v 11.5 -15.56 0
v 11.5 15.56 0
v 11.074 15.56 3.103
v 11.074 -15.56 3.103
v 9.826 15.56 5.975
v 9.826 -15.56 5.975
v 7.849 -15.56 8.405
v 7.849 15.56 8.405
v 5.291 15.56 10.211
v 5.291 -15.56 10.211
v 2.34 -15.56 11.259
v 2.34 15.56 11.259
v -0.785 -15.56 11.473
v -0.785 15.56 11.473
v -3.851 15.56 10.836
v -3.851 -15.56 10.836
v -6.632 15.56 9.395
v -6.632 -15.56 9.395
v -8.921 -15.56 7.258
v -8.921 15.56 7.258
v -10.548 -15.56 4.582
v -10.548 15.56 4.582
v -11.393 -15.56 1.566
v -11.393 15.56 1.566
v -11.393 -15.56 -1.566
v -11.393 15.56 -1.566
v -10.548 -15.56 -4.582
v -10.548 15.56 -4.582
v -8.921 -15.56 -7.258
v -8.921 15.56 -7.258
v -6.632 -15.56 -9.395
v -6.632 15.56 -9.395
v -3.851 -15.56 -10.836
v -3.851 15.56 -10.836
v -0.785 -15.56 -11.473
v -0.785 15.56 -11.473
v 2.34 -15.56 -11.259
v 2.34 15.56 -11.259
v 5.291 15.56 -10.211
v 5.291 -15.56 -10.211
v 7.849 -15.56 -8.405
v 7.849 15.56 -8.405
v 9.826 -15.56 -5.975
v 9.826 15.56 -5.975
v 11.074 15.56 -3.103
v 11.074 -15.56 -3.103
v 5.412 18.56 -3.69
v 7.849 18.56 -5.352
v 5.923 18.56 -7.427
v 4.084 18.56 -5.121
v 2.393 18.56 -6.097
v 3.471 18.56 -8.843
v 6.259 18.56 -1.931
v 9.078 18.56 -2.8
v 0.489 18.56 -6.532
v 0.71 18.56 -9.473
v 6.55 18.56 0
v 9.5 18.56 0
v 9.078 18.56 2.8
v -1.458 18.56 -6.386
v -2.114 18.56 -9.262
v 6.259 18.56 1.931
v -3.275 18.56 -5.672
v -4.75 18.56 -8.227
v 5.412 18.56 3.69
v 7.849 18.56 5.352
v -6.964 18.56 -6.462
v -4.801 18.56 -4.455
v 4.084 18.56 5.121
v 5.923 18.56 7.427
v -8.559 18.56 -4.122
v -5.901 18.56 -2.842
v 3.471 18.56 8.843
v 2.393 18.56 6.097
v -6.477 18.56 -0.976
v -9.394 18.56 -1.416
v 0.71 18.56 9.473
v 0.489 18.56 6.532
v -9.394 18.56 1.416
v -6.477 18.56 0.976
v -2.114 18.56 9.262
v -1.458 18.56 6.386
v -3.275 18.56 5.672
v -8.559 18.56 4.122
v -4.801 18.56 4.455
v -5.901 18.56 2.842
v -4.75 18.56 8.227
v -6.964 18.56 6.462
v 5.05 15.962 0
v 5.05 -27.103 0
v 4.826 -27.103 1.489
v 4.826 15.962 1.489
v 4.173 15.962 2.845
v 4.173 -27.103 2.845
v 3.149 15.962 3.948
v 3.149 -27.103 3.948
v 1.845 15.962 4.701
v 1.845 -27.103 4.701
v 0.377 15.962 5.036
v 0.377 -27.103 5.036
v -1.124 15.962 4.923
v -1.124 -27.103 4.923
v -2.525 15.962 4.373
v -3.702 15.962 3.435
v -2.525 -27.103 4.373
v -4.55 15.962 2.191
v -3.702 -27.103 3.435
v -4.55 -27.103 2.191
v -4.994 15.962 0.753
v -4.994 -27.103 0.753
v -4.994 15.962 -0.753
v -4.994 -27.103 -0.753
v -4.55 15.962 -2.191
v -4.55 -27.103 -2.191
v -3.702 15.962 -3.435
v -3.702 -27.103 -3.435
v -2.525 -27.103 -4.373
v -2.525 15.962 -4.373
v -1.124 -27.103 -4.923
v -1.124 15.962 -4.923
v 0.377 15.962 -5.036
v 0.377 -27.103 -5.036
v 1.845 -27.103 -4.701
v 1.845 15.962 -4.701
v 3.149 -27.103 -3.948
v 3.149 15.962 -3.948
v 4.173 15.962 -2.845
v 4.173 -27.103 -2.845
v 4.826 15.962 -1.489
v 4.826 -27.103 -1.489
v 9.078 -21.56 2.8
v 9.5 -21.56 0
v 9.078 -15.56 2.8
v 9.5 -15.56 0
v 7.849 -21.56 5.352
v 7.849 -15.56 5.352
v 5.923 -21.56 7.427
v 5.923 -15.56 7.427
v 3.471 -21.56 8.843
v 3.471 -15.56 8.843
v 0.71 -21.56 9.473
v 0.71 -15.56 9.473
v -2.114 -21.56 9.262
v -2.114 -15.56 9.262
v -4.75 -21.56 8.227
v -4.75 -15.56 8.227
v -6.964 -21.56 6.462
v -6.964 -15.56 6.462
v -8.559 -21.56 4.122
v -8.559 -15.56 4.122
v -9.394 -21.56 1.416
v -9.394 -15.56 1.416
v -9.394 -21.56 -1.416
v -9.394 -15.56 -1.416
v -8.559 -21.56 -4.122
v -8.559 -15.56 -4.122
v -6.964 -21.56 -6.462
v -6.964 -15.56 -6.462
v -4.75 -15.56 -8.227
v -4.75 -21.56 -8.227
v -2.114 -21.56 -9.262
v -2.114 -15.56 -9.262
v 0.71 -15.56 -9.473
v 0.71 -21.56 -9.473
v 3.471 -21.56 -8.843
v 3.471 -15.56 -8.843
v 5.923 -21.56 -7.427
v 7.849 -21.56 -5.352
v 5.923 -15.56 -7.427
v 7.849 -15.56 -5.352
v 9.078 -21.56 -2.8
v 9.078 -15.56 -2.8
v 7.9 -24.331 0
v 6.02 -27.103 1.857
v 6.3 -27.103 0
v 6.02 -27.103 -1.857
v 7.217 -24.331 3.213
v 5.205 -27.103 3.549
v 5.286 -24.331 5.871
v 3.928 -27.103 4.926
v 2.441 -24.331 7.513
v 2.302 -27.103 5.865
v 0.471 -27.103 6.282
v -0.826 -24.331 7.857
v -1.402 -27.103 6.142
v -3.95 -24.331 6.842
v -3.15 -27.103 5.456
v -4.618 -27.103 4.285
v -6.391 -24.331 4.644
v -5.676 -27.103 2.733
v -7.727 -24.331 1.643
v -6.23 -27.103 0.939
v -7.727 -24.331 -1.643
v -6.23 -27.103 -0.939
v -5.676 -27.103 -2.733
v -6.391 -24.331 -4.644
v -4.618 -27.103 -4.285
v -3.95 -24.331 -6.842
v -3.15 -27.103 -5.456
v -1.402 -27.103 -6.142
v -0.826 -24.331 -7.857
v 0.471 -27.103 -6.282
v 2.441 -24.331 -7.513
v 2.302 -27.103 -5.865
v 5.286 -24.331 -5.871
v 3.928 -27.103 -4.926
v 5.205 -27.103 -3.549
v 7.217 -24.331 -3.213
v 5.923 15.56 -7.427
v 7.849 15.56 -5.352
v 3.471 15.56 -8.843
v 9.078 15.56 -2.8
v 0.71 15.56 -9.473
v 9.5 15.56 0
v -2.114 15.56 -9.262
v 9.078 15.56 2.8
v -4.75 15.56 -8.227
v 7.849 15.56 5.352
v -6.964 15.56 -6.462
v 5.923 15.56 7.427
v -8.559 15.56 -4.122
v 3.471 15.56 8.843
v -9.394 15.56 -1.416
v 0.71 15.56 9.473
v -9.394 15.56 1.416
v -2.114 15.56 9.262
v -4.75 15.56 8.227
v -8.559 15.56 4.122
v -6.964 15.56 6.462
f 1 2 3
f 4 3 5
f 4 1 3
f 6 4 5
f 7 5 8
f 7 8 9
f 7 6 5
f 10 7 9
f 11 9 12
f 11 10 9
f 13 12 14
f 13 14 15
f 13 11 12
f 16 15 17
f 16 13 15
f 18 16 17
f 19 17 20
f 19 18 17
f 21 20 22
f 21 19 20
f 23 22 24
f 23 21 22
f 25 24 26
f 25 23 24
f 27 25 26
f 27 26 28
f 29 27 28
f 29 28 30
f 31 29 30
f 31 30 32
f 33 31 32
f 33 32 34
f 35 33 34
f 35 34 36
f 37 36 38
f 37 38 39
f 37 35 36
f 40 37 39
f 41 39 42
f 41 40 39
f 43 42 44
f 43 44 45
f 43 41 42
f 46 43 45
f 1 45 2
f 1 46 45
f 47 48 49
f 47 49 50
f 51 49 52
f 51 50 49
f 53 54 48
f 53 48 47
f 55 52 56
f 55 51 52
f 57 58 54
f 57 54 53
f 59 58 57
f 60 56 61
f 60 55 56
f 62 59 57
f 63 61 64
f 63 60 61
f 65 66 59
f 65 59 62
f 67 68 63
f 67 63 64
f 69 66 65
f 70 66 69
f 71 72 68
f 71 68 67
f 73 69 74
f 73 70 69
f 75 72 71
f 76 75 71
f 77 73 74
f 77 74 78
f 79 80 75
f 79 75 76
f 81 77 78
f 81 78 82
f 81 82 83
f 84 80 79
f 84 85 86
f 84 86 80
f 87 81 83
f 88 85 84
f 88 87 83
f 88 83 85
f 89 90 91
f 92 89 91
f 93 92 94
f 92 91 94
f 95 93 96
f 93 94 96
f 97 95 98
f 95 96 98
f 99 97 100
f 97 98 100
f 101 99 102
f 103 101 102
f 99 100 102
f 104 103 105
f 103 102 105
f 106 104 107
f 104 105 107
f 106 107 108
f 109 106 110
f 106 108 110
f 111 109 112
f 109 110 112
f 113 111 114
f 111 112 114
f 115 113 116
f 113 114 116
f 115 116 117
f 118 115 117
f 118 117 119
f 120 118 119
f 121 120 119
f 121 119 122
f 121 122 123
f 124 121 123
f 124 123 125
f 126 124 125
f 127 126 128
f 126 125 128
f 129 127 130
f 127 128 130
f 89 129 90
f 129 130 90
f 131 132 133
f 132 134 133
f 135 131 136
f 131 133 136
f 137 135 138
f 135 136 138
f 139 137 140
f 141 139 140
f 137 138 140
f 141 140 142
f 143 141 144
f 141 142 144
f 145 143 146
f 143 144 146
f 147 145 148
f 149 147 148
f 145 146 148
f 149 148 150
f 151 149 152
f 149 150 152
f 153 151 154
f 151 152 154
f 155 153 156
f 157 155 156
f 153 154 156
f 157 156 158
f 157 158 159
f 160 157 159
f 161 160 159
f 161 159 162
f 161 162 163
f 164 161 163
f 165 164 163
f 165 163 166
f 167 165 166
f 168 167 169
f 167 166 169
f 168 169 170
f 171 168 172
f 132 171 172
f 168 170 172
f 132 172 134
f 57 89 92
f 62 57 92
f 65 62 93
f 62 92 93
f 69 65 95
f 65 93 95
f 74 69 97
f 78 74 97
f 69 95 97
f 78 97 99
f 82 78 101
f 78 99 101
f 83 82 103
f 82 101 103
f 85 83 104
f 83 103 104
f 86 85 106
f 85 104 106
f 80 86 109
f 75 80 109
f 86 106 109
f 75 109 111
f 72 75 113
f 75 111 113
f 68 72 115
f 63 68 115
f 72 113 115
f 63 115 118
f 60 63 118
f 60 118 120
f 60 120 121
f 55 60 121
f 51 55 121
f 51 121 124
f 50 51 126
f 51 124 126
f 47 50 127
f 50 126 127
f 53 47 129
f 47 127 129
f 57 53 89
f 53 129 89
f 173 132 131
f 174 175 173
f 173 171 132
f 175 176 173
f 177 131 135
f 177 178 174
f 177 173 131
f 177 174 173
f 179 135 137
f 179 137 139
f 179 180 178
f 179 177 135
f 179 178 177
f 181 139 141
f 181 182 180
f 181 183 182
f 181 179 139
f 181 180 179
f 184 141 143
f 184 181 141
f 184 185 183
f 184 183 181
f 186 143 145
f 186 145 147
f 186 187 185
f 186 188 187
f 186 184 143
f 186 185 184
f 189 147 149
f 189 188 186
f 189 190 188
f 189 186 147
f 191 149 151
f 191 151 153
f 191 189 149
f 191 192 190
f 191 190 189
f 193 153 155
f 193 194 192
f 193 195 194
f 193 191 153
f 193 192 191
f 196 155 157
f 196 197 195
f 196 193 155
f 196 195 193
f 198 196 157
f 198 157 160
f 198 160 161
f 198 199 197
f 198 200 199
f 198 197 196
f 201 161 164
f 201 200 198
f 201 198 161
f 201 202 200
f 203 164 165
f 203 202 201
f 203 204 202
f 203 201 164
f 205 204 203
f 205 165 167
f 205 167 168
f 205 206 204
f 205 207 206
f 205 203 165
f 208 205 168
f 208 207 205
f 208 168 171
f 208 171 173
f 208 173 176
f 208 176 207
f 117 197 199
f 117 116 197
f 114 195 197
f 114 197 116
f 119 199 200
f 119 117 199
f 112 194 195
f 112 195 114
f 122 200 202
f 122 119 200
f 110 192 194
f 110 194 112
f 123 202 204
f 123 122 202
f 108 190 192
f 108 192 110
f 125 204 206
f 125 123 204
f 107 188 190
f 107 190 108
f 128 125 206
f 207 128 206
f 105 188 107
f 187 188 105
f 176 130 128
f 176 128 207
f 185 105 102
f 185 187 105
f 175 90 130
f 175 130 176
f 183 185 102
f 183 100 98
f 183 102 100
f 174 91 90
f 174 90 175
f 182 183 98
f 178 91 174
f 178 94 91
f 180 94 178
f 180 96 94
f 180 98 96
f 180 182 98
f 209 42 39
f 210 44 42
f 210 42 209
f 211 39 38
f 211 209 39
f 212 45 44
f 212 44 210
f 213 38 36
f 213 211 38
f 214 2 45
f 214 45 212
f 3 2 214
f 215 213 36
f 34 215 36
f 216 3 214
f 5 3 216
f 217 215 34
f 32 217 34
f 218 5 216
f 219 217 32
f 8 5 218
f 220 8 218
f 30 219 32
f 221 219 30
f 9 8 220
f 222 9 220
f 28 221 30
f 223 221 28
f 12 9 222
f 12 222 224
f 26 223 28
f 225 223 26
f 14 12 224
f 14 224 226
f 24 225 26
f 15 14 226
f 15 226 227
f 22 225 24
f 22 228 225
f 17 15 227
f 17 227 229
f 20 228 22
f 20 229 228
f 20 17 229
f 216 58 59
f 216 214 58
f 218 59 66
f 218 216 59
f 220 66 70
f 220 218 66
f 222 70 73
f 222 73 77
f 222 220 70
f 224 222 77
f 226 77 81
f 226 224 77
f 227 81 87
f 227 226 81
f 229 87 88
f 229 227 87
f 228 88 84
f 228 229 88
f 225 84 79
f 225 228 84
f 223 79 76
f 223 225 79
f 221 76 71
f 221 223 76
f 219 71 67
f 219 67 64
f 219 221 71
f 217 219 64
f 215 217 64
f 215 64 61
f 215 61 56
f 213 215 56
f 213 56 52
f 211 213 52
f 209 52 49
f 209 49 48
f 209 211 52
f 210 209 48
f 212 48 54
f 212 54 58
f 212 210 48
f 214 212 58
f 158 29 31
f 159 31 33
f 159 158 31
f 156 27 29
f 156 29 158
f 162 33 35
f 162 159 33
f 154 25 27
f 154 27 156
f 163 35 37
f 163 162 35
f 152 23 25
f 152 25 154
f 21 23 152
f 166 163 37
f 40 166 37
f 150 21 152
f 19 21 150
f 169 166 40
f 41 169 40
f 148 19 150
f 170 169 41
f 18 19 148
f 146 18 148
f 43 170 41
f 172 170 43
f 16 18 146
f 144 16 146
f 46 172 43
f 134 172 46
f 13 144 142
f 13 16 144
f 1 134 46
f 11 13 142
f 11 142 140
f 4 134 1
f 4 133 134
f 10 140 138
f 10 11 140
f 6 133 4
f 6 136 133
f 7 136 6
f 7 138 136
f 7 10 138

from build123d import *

# Parameters (mm, degrees)
CHAMFER1_SIZE  = 1.5
CHAMFER1_SIZE2 = 2.598076211


with BuildPart() as part:
    # Sketch1 → Revolve1 (revolve)
    with BuildSketch(Plane.XY):
        Polygon((5.05, -18.56), (5.05, 18.56), (9.5, 18.56), (9.5, 15.56), (11.5, 15.56), (11.5, -15.56), (9.5, -15.56), (9.5, -18.56), (9.5, -21.56), (6.3, -27.102562584), (5.05, -27.102562584), align=None)
    revolve(axis=Axis((0, 19.533170402, 0), (0, -1, 0)))

    # Chamfer1
    chamfer1_edges = [part.edges().sort_by_distance(p)[0] for p in [
        (-5.05, 18.56, 0),
    ]]
    chamfer1_side = [part.faces().sort_by_distance(p)[0] for p in [
        (-5.318700577, 18.56, 0),
    ]]
    chamfer(chamfer1_edges, length=CHAMFER1_SIZE, length2=CHAMFER1_SIZE2, reference=chamfer1_side[0])


solid = part.part
